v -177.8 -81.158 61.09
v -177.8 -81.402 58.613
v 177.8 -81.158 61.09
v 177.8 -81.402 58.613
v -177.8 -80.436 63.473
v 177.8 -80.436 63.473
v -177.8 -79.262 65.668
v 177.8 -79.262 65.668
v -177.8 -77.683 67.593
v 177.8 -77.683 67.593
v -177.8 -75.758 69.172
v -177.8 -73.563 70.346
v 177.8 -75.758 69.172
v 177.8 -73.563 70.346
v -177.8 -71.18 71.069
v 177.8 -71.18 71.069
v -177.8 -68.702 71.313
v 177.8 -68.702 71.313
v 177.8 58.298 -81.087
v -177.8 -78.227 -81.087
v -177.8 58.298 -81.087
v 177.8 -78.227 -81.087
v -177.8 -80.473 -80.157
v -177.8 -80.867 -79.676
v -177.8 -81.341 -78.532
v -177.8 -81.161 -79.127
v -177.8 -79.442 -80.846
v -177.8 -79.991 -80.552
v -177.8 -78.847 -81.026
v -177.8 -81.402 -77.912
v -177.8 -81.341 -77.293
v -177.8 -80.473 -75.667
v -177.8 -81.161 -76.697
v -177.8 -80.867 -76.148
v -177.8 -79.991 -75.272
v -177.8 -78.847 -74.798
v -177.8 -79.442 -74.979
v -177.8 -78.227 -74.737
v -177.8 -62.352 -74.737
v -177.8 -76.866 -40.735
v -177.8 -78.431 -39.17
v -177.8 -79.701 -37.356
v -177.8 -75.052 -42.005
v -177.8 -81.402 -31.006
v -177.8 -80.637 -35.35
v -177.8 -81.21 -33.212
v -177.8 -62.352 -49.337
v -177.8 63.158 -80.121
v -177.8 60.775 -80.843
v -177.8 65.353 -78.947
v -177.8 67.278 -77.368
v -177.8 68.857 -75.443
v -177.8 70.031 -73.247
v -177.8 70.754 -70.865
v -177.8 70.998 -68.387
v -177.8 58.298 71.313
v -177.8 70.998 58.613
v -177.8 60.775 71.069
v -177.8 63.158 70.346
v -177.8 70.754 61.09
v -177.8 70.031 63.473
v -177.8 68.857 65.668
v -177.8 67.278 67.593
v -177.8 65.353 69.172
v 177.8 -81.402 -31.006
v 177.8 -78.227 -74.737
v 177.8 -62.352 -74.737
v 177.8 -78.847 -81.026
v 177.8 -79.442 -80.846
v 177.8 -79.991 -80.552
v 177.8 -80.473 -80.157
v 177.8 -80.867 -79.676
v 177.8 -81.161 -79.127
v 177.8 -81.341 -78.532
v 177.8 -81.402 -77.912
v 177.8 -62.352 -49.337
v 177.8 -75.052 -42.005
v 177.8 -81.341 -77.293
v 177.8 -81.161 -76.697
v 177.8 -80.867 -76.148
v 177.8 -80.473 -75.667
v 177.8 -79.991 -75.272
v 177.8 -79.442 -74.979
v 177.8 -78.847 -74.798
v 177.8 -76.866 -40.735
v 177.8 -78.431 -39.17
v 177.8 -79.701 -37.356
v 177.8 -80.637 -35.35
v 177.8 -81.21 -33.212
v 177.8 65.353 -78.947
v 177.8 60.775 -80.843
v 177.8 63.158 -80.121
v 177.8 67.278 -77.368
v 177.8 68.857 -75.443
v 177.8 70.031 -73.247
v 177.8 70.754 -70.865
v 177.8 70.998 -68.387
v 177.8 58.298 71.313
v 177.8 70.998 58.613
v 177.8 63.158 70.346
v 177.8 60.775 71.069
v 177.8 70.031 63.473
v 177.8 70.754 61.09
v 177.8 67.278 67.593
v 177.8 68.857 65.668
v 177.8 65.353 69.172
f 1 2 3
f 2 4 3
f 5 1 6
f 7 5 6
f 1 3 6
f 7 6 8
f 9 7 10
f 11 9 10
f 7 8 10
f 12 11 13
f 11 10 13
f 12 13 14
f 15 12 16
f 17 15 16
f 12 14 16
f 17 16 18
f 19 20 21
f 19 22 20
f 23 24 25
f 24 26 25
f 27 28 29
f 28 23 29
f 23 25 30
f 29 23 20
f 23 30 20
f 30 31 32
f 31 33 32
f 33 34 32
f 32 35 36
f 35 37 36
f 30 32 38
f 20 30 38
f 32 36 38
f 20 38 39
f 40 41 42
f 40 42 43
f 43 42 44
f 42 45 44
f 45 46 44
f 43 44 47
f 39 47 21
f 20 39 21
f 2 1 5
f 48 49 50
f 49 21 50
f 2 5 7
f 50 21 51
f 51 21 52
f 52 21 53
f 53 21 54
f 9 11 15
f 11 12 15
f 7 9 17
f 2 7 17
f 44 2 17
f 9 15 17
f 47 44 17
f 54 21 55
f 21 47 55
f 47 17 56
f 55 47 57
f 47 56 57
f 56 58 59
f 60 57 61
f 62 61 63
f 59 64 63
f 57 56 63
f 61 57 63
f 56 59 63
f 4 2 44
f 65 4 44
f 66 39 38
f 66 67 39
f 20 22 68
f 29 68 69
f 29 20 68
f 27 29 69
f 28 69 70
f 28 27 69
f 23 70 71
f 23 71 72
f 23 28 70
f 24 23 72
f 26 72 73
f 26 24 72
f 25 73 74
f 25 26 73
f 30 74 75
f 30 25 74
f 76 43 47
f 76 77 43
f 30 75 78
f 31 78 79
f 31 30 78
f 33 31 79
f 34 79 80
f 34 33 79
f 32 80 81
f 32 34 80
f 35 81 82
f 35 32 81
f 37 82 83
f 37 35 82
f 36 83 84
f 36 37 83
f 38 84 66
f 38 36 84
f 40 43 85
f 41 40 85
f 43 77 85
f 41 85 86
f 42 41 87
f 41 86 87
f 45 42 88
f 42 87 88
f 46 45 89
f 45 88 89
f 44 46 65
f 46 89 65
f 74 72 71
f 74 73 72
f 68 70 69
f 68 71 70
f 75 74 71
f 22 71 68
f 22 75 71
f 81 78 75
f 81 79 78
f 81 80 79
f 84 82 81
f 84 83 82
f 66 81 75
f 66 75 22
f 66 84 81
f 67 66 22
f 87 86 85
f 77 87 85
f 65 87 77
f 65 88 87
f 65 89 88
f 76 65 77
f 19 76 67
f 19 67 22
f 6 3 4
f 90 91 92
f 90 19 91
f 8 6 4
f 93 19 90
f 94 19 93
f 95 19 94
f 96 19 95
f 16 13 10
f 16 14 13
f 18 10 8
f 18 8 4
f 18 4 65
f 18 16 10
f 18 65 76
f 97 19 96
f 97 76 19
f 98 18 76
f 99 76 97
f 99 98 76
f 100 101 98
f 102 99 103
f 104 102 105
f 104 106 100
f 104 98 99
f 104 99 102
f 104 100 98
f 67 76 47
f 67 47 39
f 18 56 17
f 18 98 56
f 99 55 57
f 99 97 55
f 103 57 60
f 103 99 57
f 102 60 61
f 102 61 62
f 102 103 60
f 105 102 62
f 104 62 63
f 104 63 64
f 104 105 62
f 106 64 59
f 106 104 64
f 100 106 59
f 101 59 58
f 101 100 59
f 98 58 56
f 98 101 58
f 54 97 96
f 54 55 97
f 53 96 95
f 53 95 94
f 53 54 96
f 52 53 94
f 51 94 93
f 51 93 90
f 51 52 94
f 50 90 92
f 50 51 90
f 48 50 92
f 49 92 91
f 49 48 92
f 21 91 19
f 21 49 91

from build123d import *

# Parameters (mm, degrees)
F1_DEPTH = 177.8
F2_R     = 12.7
F3_R     = 3.17499


# Not quite as in the source:
# - a fillet or chamfer is up to 0.001 mm smaller than in the source, because OpenCascade refuses the exact size


with BuildPart() as f1:
    # F0 (on Right) → F1 (new body, symmetric)
    with BuildSketch(Plane.YZ):
        Polygon((70.9975426912, -81.0872844047), (70.9975426912, 71.3127155953), (-81.4024573088, 71.3127155953), (-81.4024573088, -38.3387617767), (-62.3524573088, -49.3372844047), (-62.3524573088, -74.7372844047), (-81.4024573088, -74.7372844047), (-81.4024573088, -81.0872844047), align=None)
    extrude(amount=F1_DEPTH, both=True)

    # F2
    f2_edges = [f1.edges().sort_by_distance(p)[0] for p in [
        (0, -81.402457, -38.338762),
        (0, -81.402457, 71.312716),
        (0, 70.997543, 71.312716),
        (0, 70.997543, -81.087284),
    ]]
    fillet(f2_edges, radius=F2_R)

    # F3 (radius 3.175 in the source; OpenCascade refuses exactly that, so slightly less here)
    f3_edges = [f1.edges().sort_by_distance(p)[0] for p in [
        (0, -81.402457, -74.737284),
        (0, -81.402457, -81.087284),
    ]]
    fillet(f3_edges, radius=F3_R)


solid = f1.part
